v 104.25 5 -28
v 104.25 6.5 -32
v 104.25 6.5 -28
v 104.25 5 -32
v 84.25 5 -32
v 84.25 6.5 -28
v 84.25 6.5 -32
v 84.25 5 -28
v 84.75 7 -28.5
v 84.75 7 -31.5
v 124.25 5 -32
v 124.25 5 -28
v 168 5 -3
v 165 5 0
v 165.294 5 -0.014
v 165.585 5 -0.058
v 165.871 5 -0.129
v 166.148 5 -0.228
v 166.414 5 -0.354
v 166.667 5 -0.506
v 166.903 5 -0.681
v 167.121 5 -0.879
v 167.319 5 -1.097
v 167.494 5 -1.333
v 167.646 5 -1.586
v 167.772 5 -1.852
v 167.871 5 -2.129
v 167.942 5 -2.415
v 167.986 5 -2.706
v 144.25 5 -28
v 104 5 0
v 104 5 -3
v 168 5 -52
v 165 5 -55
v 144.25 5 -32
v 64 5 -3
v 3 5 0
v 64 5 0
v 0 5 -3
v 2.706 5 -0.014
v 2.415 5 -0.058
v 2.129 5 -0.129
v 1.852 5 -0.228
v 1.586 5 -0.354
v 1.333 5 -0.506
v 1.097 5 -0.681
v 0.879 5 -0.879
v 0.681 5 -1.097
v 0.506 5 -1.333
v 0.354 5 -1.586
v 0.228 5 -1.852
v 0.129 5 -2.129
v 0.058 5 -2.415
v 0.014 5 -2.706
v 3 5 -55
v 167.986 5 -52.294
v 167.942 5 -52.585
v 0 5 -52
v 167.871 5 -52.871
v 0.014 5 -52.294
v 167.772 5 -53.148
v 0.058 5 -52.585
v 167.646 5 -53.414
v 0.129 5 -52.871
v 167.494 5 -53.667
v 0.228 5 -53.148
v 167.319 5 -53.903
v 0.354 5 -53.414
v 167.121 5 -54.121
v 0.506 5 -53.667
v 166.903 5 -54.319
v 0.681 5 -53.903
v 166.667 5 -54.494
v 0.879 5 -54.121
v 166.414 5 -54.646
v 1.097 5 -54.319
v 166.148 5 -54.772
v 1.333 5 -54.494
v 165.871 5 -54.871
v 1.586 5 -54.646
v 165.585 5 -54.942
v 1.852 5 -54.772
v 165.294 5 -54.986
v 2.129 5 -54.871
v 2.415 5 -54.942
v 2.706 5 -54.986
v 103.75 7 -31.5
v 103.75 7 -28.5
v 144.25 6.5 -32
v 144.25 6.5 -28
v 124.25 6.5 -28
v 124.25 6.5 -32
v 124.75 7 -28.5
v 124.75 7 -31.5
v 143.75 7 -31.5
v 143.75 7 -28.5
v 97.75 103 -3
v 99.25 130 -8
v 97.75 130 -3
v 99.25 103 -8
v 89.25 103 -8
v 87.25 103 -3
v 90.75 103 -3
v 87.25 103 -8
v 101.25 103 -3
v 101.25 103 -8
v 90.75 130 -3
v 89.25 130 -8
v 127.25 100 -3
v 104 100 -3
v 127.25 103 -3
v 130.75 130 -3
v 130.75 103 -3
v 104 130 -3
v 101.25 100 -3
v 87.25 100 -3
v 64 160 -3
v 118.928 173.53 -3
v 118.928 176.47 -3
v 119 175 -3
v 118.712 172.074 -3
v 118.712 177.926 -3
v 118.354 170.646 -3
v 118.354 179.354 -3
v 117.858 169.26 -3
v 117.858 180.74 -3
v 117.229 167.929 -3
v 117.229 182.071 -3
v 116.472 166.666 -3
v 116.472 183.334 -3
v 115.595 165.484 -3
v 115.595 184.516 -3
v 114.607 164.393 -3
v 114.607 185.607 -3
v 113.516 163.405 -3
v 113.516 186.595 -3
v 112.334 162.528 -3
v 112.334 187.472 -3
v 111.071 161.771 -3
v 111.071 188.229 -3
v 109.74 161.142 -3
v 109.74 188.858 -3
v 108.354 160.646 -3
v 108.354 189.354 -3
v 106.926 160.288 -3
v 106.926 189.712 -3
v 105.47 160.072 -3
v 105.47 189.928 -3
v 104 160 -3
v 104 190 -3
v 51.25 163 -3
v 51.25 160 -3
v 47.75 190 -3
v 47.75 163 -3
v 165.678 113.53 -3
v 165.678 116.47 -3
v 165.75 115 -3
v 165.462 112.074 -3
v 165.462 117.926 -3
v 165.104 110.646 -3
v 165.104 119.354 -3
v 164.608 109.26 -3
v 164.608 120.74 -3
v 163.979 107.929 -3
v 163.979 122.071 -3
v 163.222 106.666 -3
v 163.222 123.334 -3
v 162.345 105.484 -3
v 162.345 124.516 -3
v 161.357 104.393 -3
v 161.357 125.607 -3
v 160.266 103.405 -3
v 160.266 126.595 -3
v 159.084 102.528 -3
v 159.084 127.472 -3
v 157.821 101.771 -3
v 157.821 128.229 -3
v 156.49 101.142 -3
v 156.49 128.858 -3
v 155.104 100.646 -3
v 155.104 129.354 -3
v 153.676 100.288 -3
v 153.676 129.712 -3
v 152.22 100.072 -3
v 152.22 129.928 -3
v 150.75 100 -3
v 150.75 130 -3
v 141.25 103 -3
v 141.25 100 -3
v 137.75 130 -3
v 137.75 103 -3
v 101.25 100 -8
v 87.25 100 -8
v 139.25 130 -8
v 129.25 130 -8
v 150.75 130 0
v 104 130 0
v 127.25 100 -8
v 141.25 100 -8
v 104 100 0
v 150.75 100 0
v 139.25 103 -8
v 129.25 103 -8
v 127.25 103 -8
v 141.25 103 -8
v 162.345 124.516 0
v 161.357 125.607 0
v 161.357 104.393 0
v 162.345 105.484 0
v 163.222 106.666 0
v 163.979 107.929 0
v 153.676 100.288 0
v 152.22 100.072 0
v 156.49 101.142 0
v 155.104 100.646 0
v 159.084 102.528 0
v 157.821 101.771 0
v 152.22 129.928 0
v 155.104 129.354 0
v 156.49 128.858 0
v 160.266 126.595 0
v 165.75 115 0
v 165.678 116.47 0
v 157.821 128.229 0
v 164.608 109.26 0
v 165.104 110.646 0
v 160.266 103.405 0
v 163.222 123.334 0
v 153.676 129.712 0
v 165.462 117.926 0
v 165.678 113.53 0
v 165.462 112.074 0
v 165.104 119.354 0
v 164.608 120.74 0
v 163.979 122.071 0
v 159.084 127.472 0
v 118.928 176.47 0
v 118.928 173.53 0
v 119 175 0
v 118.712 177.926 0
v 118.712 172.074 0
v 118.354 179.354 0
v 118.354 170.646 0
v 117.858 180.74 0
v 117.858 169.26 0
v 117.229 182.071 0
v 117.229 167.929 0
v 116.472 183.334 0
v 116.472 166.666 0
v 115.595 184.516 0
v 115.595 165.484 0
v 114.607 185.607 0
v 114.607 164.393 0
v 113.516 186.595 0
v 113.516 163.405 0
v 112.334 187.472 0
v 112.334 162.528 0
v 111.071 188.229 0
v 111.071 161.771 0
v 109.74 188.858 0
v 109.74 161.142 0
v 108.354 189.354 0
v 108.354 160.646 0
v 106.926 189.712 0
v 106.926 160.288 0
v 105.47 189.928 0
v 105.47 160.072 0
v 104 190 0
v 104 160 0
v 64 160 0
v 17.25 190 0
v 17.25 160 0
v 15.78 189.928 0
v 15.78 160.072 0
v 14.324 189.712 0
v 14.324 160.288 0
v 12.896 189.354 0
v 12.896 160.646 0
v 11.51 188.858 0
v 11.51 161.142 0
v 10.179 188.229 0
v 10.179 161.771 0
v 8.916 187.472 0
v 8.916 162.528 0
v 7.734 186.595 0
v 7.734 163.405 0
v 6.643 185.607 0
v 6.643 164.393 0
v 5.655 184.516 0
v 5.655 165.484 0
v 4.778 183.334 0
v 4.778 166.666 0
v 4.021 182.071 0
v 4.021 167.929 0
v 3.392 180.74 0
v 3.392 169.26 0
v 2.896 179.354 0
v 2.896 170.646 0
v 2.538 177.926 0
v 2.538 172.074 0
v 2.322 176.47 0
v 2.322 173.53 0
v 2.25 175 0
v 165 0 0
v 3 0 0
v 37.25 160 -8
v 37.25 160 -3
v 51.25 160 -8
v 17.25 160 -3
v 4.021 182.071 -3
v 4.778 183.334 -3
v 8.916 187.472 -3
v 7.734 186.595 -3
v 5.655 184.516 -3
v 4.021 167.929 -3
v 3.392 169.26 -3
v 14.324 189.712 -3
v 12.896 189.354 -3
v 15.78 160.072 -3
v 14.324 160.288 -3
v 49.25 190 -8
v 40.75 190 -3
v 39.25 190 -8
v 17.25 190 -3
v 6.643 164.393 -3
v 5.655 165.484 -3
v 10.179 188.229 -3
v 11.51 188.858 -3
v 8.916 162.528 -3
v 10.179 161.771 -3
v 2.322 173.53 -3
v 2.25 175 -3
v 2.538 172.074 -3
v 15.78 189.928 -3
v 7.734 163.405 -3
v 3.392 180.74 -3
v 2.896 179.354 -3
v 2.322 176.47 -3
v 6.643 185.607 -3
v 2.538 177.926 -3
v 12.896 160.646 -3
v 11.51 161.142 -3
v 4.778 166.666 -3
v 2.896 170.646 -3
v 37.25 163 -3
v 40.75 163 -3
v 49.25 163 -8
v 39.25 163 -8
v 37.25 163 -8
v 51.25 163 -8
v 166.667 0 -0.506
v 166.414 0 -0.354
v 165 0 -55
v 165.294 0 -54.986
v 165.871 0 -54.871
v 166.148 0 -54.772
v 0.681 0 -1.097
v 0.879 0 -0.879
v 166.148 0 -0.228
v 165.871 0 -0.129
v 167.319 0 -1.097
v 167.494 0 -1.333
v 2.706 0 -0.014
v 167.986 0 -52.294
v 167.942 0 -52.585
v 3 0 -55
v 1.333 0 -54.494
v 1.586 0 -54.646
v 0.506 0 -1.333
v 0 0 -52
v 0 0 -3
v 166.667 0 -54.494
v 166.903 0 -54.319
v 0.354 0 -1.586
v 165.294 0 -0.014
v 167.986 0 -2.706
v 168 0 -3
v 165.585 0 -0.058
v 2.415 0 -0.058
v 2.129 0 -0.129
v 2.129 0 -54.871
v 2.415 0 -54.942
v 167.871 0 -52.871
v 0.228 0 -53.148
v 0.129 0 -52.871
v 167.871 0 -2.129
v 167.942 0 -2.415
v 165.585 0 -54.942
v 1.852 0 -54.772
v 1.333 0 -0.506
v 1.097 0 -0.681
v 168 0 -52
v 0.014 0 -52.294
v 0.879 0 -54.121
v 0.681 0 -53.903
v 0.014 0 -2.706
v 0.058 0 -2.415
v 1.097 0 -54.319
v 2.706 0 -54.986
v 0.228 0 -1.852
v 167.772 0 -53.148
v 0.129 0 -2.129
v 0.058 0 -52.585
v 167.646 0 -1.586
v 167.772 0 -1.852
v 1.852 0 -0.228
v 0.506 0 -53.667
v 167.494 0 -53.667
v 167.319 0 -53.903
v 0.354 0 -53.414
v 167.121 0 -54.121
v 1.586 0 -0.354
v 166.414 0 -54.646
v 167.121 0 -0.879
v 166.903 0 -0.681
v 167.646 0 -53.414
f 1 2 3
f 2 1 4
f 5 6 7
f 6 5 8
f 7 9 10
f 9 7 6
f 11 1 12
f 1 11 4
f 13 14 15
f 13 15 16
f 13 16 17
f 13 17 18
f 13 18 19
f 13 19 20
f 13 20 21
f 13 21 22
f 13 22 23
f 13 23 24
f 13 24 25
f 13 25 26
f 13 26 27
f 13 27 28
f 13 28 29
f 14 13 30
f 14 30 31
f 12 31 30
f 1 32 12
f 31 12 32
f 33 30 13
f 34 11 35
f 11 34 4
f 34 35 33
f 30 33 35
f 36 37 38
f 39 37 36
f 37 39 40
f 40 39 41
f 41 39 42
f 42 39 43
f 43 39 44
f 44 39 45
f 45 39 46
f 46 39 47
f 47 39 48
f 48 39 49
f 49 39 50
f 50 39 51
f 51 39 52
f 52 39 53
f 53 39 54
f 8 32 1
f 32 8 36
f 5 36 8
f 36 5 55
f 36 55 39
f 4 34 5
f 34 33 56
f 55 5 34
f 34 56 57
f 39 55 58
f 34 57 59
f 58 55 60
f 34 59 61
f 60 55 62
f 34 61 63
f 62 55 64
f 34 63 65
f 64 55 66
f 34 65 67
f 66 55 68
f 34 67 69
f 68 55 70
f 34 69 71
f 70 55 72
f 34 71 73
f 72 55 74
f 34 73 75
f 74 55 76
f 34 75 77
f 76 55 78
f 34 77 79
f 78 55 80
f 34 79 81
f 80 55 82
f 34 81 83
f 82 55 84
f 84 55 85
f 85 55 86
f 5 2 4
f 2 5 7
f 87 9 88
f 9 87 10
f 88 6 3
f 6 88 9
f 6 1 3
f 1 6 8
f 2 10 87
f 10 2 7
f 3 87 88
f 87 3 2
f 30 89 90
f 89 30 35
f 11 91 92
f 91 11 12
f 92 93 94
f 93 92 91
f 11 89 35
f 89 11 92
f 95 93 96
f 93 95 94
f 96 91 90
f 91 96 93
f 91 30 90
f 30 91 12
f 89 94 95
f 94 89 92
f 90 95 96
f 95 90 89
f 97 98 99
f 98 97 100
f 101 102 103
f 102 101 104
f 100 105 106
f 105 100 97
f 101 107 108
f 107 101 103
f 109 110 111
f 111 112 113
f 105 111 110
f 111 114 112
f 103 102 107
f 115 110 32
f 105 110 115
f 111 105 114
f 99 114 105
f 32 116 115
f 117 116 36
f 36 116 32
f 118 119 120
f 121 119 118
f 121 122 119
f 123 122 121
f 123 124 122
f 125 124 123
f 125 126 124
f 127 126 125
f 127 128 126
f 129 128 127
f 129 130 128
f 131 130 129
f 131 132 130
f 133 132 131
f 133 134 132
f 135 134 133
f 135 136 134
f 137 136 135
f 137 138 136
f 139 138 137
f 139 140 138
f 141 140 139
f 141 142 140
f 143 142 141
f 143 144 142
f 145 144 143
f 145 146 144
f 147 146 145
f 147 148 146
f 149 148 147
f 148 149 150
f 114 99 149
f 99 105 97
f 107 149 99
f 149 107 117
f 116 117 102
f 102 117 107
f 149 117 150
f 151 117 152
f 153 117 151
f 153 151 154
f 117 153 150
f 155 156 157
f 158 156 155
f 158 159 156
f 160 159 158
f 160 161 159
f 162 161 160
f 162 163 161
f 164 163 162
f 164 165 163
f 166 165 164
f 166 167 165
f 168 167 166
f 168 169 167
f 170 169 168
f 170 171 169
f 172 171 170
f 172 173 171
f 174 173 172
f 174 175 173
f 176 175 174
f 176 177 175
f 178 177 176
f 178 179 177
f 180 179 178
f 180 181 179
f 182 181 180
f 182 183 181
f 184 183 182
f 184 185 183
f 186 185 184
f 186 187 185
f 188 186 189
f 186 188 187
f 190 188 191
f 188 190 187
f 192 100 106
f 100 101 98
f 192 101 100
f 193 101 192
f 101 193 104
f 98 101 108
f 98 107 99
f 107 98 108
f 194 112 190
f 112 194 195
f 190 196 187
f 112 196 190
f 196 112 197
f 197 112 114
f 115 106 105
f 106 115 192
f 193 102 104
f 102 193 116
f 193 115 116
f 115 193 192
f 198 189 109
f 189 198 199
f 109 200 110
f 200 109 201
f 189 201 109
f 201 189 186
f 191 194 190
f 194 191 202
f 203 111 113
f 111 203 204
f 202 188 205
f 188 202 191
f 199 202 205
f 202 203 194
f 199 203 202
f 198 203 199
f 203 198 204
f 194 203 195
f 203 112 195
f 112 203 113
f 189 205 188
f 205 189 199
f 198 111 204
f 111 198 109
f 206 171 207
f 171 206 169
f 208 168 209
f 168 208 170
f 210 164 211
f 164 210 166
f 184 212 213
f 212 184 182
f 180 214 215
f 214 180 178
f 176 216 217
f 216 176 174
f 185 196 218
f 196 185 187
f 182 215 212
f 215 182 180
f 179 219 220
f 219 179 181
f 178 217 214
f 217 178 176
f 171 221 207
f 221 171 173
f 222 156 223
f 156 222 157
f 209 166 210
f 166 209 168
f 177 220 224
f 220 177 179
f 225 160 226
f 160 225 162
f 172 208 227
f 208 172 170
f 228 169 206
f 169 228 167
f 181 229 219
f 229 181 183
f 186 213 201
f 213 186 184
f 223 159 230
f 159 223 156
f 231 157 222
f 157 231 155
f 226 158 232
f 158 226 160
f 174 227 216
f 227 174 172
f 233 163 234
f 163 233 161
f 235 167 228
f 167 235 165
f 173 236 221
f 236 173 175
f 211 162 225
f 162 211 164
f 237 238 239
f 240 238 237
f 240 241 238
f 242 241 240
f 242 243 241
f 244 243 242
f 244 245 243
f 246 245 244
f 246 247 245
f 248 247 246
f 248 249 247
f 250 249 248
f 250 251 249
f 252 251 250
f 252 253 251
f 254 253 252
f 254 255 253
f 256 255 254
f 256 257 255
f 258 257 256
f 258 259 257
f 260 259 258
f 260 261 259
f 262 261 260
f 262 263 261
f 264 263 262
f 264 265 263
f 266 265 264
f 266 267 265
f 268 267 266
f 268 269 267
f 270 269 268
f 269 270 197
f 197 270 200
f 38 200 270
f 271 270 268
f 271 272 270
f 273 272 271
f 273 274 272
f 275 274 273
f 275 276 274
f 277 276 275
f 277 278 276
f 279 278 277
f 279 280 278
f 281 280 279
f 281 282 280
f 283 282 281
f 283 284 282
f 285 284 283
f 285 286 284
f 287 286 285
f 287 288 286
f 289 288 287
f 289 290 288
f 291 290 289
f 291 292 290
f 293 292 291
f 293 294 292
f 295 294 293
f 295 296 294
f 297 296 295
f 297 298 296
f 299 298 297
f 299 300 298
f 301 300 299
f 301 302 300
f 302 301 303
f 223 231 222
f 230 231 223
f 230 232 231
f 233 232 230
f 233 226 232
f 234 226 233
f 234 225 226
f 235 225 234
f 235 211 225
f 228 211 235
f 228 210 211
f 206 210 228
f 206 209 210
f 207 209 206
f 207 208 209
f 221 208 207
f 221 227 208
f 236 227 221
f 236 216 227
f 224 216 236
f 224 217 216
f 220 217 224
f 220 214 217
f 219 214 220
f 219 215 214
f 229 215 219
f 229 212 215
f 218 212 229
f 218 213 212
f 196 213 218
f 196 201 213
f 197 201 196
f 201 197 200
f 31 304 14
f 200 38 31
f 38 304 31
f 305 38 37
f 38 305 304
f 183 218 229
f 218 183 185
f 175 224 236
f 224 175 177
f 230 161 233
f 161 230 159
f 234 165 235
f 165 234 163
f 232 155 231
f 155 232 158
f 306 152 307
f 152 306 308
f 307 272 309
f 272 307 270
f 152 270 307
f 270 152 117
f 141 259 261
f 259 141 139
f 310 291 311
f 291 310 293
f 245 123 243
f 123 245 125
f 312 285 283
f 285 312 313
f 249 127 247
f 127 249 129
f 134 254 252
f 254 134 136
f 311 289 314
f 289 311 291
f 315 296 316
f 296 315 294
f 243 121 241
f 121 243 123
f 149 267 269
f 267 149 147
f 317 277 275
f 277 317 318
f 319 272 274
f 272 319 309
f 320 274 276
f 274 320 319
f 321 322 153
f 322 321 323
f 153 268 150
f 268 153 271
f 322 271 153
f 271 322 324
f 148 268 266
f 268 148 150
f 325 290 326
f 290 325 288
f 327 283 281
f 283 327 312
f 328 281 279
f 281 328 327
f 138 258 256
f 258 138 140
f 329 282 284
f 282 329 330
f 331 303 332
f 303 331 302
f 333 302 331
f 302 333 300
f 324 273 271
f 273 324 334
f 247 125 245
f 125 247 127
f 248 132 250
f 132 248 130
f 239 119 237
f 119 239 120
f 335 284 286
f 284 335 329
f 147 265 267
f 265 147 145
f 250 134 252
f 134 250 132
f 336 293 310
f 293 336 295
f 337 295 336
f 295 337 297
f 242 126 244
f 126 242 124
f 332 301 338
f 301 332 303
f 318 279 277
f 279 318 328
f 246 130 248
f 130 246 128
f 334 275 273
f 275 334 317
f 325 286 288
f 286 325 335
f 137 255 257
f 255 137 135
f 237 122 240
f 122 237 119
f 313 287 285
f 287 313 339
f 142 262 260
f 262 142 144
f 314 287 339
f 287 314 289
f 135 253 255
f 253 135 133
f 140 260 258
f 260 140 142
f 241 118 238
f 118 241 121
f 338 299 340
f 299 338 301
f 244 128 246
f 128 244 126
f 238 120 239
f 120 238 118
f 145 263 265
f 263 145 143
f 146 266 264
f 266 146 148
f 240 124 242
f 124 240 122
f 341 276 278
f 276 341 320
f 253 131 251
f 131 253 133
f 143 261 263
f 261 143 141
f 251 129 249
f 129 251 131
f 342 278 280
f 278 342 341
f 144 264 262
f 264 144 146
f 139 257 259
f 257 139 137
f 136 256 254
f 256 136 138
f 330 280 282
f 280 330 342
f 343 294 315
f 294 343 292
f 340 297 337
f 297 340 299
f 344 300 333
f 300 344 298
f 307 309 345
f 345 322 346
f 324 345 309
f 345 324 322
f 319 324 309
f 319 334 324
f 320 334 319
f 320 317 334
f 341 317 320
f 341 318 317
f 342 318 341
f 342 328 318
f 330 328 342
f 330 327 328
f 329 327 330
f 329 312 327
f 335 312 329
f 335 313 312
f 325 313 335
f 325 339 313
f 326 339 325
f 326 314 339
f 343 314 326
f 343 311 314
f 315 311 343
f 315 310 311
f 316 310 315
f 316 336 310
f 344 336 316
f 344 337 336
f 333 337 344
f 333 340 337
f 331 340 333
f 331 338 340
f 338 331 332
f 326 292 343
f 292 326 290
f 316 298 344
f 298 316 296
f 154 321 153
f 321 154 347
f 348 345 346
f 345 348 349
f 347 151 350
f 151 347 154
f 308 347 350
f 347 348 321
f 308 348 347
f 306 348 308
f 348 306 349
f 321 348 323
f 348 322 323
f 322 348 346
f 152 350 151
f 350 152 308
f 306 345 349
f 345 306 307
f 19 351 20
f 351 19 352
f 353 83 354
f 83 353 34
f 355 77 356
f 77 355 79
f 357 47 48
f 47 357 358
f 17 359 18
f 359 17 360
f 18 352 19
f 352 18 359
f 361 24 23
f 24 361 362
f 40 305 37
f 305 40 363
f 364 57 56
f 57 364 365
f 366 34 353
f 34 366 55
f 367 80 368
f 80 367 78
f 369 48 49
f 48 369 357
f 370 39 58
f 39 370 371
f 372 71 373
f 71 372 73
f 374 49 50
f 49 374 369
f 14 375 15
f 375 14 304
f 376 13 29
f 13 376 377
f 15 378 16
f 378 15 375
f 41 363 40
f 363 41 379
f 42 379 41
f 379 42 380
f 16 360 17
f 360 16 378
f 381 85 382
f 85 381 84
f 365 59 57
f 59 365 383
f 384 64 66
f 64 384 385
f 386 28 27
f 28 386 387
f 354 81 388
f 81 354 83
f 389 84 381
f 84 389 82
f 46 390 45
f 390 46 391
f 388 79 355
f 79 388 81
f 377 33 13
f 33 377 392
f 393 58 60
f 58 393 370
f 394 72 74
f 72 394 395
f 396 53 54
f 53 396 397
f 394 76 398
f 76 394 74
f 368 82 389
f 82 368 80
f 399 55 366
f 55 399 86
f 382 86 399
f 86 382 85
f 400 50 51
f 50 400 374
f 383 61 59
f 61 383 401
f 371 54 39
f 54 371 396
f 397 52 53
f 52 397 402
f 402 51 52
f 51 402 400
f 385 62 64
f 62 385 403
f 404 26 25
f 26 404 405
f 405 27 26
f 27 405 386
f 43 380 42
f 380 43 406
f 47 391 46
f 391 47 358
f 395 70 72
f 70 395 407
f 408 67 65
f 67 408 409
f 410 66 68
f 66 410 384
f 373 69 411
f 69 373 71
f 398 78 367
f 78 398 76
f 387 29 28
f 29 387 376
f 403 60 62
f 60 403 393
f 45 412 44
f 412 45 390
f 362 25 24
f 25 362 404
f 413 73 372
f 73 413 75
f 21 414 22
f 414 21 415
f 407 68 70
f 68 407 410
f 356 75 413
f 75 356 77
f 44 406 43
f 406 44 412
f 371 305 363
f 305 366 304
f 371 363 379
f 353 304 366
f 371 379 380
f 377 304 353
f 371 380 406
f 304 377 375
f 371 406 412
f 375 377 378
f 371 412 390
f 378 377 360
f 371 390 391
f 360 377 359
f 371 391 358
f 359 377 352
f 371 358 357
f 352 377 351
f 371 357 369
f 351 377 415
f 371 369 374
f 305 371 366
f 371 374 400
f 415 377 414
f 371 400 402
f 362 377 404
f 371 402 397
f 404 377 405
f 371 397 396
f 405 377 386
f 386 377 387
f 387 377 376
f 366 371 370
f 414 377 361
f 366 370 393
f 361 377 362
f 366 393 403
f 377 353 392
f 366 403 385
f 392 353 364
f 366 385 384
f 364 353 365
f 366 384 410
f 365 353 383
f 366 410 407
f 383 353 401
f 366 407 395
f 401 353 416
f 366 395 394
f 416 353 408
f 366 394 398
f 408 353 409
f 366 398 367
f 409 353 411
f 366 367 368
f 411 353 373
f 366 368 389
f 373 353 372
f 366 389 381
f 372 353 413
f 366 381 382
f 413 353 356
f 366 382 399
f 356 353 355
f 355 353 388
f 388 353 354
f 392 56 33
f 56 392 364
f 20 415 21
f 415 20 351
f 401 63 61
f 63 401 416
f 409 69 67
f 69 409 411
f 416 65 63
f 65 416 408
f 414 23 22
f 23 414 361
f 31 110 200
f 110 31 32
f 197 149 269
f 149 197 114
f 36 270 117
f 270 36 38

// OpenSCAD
// =====================================
// Toothbrush Holder Backplate - Print File
// Base + stand + plates with dovetail rails
// Print lying on its back (flat on bed)
// =====================================

include <_toothbrush_holder.scad>

// Print orientation, NOT a viewer hack: toothbrush_backplate() stands upright
// in the library; this lays it on its back, flat on the bed. Keep it.
rotate([-90, 0, 0])
    toothbrush_backplate();
